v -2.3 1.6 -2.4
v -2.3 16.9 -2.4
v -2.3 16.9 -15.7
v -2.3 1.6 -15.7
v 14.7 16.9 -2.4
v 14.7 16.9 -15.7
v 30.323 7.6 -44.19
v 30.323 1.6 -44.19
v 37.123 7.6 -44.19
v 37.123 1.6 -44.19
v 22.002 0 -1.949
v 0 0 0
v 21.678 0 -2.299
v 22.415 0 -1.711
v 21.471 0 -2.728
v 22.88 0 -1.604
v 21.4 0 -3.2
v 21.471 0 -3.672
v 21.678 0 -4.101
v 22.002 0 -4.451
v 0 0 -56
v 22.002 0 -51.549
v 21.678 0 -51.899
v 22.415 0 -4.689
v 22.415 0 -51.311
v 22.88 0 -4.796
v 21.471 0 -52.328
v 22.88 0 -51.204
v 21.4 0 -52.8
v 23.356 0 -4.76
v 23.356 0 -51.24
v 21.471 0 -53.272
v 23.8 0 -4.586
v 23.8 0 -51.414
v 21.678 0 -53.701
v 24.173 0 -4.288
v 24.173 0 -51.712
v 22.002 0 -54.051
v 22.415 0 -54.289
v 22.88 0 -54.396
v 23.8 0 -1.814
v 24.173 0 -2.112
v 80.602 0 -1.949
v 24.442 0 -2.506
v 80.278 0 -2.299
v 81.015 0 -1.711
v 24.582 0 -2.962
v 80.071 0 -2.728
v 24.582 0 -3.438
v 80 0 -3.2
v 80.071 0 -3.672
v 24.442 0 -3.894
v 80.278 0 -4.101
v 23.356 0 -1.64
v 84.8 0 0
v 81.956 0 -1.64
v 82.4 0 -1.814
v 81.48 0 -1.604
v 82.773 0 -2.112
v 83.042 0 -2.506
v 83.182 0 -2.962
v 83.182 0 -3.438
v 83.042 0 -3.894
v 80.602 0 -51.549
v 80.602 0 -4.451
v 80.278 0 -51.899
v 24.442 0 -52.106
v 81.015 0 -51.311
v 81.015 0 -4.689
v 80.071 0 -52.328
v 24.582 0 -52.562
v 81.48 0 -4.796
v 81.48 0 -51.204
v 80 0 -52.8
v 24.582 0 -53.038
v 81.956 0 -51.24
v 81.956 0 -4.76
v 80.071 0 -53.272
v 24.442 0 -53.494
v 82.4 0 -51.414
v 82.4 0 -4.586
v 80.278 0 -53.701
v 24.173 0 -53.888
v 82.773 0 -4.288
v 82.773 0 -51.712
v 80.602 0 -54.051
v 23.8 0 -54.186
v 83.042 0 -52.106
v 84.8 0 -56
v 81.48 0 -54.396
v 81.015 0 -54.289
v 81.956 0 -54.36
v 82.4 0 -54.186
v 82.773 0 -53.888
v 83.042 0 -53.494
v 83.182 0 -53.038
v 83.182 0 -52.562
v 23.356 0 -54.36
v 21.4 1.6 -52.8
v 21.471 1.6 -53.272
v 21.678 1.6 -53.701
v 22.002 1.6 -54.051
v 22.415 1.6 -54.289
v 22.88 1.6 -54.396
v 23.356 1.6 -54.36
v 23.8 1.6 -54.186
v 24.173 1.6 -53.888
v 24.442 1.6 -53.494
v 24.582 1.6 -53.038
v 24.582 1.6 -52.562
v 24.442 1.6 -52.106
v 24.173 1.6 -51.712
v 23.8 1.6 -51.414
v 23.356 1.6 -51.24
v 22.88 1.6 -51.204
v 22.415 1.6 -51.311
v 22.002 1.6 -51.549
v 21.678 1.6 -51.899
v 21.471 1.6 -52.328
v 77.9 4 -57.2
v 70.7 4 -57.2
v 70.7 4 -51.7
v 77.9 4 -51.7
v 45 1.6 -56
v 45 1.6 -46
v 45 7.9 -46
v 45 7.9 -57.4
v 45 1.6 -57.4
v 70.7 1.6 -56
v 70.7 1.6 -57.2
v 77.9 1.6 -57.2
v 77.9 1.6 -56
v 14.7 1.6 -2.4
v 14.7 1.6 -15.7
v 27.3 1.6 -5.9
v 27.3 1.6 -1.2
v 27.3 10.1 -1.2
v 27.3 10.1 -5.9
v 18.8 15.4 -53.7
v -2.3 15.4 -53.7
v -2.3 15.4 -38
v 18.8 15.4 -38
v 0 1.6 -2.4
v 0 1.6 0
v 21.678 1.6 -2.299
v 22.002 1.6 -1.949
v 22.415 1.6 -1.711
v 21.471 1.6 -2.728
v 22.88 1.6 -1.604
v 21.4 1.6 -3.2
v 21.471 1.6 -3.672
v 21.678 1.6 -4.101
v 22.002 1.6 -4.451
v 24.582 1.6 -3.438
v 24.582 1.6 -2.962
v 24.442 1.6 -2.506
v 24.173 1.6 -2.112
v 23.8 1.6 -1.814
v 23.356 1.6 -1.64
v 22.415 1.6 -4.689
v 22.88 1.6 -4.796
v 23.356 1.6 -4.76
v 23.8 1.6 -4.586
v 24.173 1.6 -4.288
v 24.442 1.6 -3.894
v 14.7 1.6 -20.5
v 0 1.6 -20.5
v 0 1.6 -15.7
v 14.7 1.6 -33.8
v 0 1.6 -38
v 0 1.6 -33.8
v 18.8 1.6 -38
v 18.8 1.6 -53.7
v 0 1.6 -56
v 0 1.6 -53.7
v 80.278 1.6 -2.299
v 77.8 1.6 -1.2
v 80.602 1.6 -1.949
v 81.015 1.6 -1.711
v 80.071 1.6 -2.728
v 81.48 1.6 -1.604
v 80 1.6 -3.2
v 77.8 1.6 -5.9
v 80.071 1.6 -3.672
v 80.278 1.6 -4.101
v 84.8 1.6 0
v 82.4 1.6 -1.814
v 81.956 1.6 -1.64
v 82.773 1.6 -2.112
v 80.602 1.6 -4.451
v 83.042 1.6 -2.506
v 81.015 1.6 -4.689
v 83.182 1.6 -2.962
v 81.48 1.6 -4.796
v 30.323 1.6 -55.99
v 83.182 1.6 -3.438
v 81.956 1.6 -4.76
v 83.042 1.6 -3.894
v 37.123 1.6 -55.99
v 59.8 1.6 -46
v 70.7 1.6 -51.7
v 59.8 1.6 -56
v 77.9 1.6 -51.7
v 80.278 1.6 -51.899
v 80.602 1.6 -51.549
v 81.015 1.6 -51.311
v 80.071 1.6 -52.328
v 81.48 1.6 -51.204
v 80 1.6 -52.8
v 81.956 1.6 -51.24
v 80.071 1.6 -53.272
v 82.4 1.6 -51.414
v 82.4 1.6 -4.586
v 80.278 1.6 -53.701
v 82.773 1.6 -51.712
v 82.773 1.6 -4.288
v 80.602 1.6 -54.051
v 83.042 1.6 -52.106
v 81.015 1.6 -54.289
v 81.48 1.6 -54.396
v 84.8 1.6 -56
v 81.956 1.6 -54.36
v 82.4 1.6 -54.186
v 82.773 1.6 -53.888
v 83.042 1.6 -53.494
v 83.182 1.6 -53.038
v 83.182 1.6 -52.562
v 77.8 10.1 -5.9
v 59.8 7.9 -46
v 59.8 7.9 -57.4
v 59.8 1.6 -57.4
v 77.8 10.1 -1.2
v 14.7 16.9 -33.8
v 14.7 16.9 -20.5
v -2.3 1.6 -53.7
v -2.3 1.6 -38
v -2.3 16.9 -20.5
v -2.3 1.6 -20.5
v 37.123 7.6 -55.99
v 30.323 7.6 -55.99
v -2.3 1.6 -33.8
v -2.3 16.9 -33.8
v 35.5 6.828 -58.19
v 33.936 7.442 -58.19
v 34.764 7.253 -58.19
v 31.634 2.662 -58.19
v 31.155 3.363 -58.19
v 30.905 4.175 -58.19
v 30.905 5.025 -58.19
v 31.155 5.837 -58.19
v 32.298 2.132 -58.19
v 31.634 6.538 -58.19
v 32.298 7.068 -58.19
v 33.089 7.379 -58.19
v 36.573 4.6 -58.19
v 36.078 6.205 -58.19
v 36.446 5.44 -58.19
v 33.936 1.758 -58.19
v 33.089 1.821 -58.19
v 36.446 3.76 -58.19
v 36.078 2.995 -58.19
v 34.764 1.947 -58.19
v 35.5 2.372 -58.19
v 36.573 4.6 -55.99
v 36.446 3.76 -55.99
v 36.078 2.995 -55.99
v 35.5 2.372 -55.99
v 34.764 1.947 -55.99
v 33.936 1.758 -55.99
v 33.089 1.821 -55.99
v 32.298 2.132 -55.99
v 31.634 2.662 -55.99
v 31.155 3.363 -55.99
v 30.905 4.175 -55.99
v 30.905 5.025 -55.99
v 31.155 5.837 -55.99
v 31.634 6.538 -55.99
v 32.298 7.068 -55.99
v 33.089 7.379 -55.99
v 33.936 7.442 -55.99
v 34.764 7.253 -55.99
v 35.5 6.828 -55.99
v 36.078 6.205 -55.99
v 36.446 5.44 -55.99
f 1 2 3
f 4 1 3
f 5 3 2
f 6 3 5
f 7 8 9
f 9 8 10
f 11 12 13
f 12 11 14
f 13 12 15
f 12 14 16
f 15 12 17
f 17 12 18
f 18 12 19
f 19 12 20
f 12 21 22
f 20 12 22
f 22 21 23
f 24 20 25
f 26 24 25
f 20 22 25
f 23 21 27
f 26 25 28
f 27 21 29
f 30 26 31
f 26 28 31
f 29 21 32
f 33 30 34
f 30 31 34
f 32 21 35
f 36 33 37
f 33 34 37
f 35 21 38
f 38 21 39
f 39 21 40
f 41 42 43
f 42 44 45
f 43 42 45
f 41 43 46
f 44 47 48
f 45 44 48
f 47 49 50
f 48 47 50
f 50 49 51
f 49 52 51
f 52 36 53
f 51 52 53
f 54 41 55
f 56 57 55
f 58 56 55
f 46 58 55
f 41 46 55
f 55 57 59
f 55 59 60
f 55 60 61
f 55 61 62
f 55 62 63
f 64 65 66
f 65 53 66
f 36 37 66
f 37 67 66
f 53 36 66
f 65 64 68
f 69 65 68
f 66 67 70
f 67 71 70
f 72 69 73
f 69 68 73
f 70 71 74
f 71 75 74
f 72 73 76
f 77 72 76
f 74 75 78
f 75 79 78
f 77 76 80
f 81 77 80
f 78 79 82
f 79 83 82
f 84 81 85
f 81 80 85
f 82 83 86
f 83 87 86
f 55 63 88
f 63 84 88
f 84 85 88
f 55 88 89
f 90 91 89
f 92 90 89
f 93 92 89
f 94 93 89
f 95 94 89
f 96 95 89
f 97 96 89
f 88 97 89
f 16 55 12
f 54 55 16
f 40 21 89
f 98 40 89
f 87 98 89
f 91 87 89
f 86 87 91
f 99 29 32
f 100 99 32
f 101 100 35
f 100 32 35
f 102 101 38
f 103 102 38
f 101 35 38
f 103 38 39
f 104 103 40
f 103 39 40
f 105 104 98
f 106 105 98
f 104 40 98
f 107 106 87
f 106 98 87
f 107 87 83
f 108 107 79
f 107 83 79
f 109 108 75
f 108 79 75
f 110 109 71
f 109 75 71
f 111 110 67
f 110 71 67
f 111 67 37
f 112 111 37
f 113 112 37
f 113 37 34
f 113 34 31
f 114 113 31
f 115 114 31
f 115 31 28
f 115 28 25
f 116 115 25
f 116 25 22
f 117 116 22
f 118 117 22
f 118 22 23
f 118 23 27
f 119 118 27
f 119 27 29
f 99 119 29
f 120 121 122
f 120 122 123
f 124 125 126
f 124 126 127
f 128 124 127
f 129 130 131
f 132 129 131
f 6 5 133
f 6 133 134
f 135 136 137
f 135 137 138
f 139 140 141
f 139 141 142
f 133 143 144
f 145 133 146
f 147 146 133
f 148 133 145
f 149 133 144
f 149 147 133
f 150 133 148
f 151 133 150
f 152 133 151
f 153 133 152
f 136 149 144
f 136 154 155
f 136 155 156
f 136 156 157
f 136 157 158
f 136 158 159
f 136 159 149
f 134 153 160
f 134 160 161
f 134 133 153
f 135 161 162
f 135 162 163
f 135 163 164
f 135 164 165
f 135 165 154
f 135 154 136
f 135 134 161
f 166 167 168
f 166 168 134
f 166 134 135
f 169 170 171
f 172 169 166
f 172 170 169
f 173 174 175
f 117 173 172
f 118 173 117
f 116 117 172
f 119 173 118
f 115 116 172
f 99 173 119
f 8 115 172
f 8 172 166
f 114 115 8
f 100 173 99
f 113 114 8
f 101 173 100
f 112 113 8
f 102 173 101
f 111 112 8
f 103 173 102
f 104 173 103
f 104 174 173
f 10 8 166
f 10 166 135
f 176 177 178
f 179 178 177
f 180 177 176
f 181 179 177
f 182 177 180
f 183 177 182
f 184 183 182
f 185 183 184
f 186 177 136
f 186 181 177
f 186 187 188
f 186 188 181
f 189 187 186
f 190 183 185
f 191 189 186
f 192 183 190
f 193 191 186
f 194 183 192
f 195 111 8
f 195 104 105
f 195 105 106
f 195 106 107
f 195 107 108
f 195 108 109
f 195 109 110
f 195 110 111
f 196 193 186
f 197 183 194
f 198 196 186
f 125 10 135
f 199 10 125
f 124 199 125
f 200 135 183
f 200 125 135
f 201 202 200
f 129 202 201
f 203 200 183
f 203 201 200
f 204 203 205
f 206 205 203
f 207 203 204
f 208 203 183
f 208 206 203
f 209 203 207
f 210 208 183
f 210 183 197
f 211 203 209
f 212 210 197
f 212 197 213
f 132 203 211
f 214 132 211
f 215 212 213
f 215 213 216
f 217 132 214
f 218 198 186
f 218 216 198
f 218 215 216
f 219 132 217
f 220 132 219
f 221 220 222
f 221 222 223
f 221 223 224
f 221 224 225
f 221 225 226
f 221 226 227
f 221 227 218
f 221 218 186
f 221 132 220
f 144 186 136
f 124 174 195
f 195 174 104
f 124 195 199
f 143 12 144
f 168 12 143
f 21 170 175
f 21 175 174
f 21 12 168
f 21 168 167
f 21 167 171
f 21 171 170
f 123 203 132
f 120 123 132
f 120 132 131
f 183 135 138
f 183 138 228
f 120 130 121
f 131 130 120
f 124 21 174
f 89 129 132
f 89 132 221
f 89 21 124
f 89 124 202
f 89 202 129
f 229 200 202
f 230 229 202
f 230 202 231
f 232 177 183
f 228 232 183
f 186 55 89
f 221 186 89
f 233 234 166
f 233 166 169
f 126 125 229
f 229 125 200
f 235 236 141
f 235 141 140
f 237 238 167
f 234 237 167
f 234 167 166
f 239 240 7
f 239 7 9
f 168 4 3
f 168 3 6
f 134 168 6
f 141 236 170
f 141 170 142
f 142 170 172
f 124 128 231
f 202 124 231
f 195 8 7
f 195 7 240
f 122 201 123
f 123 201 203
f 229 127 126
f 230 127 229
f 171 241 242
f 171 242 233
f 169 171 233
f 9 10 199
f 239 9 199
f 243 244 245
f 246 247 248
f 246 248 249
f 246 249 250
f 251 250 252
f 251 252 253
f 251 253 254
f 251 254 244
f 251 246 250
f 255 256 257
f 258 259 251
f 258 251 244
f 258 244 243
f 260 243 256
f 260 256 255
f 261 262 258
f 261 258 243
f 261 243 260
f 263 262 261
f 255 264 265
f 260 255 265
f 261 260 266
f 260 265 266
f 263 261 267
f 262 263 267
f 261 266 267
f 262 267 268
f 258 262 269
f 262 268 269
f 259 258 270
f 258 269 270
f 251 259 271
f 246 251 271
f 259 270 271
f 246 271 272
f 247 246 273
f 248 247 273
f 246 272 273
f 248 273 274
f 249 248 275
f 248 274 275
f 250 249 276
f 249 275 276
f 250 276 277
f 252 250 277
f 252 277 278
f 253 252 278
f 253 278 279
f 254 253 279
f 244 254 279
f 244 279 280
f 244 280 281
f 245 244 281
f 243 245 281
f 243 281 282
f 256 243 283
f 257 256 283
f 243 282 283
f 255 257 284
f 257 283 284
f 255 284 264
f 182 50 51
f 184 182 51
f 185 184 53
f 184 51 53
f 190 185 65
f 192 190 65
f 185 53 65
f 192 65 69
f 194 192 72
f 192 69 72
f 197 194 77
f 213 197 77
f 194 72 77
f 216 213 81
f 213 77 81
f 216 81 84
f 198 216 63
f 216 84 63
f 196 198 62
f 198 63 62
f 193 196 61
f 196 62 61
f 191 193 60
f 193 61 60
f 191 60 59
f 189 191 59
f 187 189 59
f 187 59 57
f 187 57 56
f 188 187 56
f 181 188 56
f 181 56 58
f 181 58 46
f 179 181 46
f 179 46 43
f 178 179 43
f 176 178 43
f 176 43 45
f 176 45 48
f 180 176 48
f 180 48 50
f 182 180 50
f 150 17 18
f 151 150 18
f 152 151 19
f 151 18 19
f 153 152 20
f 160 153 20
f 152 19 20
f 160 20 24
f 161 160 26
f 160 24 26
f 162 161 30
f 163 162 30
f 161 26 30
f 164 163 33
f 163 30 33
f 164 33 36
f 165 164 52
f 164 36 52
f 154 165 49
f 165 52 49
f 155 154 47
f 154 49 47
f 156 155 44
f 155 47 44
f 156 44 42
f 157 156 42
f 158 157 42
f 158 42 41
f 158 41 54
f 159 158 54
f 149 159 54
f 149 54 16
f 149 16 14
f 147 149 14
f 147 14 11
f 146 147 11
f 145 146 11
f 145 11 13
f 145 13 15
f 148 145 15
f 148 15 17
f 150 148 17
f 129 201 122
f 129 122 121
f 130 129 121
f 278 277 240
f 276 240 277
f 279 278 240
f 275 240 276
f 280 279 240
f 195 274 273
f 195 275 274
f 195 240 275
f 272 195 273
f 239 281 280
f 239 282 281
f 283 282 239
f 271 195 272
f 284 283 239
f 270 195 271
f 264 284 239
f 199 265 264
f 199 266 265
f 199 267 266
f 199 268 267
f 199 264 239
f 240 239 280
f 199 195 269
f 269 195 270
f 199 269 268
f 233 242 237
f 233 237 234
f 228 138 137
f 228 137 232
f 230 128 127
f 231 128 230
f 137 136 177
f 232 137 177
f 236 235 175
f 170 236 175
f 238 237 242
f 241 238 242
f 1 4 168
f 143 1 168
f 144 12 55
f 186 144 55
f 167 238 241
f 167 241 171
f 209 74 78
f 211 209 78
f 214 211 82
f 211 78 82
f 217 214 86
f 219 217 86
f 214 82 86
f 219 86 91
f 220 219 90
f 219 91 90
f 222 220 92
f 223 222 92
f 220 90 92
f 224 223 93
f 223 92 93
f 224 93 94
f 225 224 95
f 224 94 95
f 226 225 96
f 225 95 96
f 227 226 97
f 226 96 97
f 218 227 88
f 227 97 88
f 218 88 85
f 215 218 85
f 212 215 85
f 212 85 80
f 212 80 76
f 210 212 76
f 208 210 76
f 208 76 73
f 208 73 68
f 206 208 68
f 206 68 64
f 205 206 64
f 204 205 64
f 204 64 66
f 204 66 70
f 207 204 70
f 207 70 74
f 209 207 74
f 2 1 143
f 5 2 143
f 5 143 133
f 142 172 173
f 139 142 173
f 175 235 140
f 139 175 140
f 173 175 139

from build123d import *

# Parameters (mm, degrees)
SKETCH1_W            = 84.8
SKETCH1_H            = 56
BOSS_EXTRUDE1_DEPTH  = 1.6
M3_CLEARANCE_SLOT1_D = 3.2
SKETCH5_W            = 50.5
SKETCH5_H            = 4.7
BOSS_EXTRUDE2_DEPTH  = 8.5
SKETCH6_W            = 21.1
SKETCH6_H            = 15.7
BOSS_EXTRUDE3_DEPTH  = 13.8
SKETCH7_W            = 17
SKETCH7_H            = 13.3
BOSS_EXTRUDE4_DEPTH  = 15.3
SKETCH8_W            = 7.2
SKETCH8_H            = 5.5
BOSS_EXTRUDE5_DEPTH  = 2.4
SKETCH9_W            = 14.8
SKETCH9_H            = 11.4
BOSS_EXTRUDE6_DEPTH  = 6.3
SKETCH10_W           = 6.8
SKETCH10_H           = 11.8
BOSS_EXTRUDE7_DEPTH  = 6
SKETCH11_R           = 2.85
BOSS_EXTRUDE8_DEPTH  = 2.2


with BuildPart() as part:
    # Sketch1 → Boss-Extrude1 (new body)
    with BuildSketch(Plane(origin=(0, 0, 0), x_dir=(1, 0, 0), z_dir=(0, 1, 0))):
        with Locations((42.4, 28)):
            Rectangle(SKETCH1_W, SKETCH1_H)
    extrude(amount=BOSS_EXTRUDE1_DEPTH)

    # M3 Clearance Slot1 (through all)
    with Locations(Plane(origin=(0, 1.6, 0), x_dir=(1, 0, 0), z_dir=(0, 1, 0))):
        with Locations((81.6, 3.2), (81.6, 52.8), (23, 52.8), (23, 3.2)):
            Hole(M3_CLEARANCE_SLOT1_D / 2)

    # Sketch5 → Boss-Extrude2 (add)
    with BuildSketch(Plane(origin=(0, 1.6, 0), x_dir=(1, 0, 0), z_dir=(0, 1, 0))):
        with Locations((52.55, 3.55)):
            Rectangle(SKETCH5_W, SKETCH5_H)
    extrude(amount=BOSS_EXTRUDE2_DEPTH)

    # Sketch6 → Boss-Extrude3 (add)
    with BuildSketch(Plane(origin=(0, 1.6, 0), x_dir=(1, 0, 0), z_dir=(0, 1, 0))):
        with Locations((8.25, 45.85)):
            Rectangle(SKETCH6_W, SKETCH6_H)
    extrude(amount=BOSS_EXTRUDE3_DEPTH)

    # Sketch7 → Boss-Extrude4 (add)
    with BuildSketch(Plane(origin=(0, 1.6, 0), x_dir=(1, 0, 0), z_dir=(0, 1, 0))):
        with Locations((6.2, 27.15)):
            Rectangle(SKETCH7_W, SKETCH7_H)
        with Locations((6.2, 9.05)):
            Rectangle(SKETCH7_W, SKETCH7_H)
    extrude(amount=BOSS_EXTRUDE4_DEPTH)

    # Sketch8 → Boss-Extrude5 (add)
    with BuildSketch(Plane(origin=(0, 1.6, 0), x_dir=(1, 0, 0), z_dir=(0, 1, 0))):
        with Locations((74.3, 54.45)):
            Rectangle(SKETCH8_W, SKETCH8_H)
    extrude(amount=BOSS_EXTRUDE5_DEPTH)

    # Sketch9 → Boss-Extrude6 (add)
    with BuildSketch(Plane(origin=(0, 1.6, 0), x_dir=(1, 0, 0), z_dir=(0, 1, 0))):
        with Locations((52.4, 51.7)):
            Rectangle(SKETCH9_W, SKETCH9_H)
    extrude(amount=BOSS_EXTRUDE6_DEPTH)

    # Sketch10 → Boss-Extrude7 (add)
    with BuildSketch(Plane(origin=(0, 1.6, 0), x_dir=(1, 0, 0), z_dir=(0, 1, 0))):
        with Locations((33.722871629, 50.09)):
            Rectangle(SKETCH10_W, SKETCH10_H)
    extrude(amount=BOSS_EXTRUDE7_DEPTH)

    # Sketch11 → Boss-Extrude8 (add)
    with BuildSketch(Plane(origin=(0, 0, -55.99), x_dir=(-1, 0, 0), z_dir=(0, 0, -1))):
        with Locations(Location((-33.722871629, 4.6, 0), (0, 0, 180))):
            Circle(SKETCH11_R)
    extrude(amount=BOSS_EXTRUDE8_DEPTH)


solid = part.part
